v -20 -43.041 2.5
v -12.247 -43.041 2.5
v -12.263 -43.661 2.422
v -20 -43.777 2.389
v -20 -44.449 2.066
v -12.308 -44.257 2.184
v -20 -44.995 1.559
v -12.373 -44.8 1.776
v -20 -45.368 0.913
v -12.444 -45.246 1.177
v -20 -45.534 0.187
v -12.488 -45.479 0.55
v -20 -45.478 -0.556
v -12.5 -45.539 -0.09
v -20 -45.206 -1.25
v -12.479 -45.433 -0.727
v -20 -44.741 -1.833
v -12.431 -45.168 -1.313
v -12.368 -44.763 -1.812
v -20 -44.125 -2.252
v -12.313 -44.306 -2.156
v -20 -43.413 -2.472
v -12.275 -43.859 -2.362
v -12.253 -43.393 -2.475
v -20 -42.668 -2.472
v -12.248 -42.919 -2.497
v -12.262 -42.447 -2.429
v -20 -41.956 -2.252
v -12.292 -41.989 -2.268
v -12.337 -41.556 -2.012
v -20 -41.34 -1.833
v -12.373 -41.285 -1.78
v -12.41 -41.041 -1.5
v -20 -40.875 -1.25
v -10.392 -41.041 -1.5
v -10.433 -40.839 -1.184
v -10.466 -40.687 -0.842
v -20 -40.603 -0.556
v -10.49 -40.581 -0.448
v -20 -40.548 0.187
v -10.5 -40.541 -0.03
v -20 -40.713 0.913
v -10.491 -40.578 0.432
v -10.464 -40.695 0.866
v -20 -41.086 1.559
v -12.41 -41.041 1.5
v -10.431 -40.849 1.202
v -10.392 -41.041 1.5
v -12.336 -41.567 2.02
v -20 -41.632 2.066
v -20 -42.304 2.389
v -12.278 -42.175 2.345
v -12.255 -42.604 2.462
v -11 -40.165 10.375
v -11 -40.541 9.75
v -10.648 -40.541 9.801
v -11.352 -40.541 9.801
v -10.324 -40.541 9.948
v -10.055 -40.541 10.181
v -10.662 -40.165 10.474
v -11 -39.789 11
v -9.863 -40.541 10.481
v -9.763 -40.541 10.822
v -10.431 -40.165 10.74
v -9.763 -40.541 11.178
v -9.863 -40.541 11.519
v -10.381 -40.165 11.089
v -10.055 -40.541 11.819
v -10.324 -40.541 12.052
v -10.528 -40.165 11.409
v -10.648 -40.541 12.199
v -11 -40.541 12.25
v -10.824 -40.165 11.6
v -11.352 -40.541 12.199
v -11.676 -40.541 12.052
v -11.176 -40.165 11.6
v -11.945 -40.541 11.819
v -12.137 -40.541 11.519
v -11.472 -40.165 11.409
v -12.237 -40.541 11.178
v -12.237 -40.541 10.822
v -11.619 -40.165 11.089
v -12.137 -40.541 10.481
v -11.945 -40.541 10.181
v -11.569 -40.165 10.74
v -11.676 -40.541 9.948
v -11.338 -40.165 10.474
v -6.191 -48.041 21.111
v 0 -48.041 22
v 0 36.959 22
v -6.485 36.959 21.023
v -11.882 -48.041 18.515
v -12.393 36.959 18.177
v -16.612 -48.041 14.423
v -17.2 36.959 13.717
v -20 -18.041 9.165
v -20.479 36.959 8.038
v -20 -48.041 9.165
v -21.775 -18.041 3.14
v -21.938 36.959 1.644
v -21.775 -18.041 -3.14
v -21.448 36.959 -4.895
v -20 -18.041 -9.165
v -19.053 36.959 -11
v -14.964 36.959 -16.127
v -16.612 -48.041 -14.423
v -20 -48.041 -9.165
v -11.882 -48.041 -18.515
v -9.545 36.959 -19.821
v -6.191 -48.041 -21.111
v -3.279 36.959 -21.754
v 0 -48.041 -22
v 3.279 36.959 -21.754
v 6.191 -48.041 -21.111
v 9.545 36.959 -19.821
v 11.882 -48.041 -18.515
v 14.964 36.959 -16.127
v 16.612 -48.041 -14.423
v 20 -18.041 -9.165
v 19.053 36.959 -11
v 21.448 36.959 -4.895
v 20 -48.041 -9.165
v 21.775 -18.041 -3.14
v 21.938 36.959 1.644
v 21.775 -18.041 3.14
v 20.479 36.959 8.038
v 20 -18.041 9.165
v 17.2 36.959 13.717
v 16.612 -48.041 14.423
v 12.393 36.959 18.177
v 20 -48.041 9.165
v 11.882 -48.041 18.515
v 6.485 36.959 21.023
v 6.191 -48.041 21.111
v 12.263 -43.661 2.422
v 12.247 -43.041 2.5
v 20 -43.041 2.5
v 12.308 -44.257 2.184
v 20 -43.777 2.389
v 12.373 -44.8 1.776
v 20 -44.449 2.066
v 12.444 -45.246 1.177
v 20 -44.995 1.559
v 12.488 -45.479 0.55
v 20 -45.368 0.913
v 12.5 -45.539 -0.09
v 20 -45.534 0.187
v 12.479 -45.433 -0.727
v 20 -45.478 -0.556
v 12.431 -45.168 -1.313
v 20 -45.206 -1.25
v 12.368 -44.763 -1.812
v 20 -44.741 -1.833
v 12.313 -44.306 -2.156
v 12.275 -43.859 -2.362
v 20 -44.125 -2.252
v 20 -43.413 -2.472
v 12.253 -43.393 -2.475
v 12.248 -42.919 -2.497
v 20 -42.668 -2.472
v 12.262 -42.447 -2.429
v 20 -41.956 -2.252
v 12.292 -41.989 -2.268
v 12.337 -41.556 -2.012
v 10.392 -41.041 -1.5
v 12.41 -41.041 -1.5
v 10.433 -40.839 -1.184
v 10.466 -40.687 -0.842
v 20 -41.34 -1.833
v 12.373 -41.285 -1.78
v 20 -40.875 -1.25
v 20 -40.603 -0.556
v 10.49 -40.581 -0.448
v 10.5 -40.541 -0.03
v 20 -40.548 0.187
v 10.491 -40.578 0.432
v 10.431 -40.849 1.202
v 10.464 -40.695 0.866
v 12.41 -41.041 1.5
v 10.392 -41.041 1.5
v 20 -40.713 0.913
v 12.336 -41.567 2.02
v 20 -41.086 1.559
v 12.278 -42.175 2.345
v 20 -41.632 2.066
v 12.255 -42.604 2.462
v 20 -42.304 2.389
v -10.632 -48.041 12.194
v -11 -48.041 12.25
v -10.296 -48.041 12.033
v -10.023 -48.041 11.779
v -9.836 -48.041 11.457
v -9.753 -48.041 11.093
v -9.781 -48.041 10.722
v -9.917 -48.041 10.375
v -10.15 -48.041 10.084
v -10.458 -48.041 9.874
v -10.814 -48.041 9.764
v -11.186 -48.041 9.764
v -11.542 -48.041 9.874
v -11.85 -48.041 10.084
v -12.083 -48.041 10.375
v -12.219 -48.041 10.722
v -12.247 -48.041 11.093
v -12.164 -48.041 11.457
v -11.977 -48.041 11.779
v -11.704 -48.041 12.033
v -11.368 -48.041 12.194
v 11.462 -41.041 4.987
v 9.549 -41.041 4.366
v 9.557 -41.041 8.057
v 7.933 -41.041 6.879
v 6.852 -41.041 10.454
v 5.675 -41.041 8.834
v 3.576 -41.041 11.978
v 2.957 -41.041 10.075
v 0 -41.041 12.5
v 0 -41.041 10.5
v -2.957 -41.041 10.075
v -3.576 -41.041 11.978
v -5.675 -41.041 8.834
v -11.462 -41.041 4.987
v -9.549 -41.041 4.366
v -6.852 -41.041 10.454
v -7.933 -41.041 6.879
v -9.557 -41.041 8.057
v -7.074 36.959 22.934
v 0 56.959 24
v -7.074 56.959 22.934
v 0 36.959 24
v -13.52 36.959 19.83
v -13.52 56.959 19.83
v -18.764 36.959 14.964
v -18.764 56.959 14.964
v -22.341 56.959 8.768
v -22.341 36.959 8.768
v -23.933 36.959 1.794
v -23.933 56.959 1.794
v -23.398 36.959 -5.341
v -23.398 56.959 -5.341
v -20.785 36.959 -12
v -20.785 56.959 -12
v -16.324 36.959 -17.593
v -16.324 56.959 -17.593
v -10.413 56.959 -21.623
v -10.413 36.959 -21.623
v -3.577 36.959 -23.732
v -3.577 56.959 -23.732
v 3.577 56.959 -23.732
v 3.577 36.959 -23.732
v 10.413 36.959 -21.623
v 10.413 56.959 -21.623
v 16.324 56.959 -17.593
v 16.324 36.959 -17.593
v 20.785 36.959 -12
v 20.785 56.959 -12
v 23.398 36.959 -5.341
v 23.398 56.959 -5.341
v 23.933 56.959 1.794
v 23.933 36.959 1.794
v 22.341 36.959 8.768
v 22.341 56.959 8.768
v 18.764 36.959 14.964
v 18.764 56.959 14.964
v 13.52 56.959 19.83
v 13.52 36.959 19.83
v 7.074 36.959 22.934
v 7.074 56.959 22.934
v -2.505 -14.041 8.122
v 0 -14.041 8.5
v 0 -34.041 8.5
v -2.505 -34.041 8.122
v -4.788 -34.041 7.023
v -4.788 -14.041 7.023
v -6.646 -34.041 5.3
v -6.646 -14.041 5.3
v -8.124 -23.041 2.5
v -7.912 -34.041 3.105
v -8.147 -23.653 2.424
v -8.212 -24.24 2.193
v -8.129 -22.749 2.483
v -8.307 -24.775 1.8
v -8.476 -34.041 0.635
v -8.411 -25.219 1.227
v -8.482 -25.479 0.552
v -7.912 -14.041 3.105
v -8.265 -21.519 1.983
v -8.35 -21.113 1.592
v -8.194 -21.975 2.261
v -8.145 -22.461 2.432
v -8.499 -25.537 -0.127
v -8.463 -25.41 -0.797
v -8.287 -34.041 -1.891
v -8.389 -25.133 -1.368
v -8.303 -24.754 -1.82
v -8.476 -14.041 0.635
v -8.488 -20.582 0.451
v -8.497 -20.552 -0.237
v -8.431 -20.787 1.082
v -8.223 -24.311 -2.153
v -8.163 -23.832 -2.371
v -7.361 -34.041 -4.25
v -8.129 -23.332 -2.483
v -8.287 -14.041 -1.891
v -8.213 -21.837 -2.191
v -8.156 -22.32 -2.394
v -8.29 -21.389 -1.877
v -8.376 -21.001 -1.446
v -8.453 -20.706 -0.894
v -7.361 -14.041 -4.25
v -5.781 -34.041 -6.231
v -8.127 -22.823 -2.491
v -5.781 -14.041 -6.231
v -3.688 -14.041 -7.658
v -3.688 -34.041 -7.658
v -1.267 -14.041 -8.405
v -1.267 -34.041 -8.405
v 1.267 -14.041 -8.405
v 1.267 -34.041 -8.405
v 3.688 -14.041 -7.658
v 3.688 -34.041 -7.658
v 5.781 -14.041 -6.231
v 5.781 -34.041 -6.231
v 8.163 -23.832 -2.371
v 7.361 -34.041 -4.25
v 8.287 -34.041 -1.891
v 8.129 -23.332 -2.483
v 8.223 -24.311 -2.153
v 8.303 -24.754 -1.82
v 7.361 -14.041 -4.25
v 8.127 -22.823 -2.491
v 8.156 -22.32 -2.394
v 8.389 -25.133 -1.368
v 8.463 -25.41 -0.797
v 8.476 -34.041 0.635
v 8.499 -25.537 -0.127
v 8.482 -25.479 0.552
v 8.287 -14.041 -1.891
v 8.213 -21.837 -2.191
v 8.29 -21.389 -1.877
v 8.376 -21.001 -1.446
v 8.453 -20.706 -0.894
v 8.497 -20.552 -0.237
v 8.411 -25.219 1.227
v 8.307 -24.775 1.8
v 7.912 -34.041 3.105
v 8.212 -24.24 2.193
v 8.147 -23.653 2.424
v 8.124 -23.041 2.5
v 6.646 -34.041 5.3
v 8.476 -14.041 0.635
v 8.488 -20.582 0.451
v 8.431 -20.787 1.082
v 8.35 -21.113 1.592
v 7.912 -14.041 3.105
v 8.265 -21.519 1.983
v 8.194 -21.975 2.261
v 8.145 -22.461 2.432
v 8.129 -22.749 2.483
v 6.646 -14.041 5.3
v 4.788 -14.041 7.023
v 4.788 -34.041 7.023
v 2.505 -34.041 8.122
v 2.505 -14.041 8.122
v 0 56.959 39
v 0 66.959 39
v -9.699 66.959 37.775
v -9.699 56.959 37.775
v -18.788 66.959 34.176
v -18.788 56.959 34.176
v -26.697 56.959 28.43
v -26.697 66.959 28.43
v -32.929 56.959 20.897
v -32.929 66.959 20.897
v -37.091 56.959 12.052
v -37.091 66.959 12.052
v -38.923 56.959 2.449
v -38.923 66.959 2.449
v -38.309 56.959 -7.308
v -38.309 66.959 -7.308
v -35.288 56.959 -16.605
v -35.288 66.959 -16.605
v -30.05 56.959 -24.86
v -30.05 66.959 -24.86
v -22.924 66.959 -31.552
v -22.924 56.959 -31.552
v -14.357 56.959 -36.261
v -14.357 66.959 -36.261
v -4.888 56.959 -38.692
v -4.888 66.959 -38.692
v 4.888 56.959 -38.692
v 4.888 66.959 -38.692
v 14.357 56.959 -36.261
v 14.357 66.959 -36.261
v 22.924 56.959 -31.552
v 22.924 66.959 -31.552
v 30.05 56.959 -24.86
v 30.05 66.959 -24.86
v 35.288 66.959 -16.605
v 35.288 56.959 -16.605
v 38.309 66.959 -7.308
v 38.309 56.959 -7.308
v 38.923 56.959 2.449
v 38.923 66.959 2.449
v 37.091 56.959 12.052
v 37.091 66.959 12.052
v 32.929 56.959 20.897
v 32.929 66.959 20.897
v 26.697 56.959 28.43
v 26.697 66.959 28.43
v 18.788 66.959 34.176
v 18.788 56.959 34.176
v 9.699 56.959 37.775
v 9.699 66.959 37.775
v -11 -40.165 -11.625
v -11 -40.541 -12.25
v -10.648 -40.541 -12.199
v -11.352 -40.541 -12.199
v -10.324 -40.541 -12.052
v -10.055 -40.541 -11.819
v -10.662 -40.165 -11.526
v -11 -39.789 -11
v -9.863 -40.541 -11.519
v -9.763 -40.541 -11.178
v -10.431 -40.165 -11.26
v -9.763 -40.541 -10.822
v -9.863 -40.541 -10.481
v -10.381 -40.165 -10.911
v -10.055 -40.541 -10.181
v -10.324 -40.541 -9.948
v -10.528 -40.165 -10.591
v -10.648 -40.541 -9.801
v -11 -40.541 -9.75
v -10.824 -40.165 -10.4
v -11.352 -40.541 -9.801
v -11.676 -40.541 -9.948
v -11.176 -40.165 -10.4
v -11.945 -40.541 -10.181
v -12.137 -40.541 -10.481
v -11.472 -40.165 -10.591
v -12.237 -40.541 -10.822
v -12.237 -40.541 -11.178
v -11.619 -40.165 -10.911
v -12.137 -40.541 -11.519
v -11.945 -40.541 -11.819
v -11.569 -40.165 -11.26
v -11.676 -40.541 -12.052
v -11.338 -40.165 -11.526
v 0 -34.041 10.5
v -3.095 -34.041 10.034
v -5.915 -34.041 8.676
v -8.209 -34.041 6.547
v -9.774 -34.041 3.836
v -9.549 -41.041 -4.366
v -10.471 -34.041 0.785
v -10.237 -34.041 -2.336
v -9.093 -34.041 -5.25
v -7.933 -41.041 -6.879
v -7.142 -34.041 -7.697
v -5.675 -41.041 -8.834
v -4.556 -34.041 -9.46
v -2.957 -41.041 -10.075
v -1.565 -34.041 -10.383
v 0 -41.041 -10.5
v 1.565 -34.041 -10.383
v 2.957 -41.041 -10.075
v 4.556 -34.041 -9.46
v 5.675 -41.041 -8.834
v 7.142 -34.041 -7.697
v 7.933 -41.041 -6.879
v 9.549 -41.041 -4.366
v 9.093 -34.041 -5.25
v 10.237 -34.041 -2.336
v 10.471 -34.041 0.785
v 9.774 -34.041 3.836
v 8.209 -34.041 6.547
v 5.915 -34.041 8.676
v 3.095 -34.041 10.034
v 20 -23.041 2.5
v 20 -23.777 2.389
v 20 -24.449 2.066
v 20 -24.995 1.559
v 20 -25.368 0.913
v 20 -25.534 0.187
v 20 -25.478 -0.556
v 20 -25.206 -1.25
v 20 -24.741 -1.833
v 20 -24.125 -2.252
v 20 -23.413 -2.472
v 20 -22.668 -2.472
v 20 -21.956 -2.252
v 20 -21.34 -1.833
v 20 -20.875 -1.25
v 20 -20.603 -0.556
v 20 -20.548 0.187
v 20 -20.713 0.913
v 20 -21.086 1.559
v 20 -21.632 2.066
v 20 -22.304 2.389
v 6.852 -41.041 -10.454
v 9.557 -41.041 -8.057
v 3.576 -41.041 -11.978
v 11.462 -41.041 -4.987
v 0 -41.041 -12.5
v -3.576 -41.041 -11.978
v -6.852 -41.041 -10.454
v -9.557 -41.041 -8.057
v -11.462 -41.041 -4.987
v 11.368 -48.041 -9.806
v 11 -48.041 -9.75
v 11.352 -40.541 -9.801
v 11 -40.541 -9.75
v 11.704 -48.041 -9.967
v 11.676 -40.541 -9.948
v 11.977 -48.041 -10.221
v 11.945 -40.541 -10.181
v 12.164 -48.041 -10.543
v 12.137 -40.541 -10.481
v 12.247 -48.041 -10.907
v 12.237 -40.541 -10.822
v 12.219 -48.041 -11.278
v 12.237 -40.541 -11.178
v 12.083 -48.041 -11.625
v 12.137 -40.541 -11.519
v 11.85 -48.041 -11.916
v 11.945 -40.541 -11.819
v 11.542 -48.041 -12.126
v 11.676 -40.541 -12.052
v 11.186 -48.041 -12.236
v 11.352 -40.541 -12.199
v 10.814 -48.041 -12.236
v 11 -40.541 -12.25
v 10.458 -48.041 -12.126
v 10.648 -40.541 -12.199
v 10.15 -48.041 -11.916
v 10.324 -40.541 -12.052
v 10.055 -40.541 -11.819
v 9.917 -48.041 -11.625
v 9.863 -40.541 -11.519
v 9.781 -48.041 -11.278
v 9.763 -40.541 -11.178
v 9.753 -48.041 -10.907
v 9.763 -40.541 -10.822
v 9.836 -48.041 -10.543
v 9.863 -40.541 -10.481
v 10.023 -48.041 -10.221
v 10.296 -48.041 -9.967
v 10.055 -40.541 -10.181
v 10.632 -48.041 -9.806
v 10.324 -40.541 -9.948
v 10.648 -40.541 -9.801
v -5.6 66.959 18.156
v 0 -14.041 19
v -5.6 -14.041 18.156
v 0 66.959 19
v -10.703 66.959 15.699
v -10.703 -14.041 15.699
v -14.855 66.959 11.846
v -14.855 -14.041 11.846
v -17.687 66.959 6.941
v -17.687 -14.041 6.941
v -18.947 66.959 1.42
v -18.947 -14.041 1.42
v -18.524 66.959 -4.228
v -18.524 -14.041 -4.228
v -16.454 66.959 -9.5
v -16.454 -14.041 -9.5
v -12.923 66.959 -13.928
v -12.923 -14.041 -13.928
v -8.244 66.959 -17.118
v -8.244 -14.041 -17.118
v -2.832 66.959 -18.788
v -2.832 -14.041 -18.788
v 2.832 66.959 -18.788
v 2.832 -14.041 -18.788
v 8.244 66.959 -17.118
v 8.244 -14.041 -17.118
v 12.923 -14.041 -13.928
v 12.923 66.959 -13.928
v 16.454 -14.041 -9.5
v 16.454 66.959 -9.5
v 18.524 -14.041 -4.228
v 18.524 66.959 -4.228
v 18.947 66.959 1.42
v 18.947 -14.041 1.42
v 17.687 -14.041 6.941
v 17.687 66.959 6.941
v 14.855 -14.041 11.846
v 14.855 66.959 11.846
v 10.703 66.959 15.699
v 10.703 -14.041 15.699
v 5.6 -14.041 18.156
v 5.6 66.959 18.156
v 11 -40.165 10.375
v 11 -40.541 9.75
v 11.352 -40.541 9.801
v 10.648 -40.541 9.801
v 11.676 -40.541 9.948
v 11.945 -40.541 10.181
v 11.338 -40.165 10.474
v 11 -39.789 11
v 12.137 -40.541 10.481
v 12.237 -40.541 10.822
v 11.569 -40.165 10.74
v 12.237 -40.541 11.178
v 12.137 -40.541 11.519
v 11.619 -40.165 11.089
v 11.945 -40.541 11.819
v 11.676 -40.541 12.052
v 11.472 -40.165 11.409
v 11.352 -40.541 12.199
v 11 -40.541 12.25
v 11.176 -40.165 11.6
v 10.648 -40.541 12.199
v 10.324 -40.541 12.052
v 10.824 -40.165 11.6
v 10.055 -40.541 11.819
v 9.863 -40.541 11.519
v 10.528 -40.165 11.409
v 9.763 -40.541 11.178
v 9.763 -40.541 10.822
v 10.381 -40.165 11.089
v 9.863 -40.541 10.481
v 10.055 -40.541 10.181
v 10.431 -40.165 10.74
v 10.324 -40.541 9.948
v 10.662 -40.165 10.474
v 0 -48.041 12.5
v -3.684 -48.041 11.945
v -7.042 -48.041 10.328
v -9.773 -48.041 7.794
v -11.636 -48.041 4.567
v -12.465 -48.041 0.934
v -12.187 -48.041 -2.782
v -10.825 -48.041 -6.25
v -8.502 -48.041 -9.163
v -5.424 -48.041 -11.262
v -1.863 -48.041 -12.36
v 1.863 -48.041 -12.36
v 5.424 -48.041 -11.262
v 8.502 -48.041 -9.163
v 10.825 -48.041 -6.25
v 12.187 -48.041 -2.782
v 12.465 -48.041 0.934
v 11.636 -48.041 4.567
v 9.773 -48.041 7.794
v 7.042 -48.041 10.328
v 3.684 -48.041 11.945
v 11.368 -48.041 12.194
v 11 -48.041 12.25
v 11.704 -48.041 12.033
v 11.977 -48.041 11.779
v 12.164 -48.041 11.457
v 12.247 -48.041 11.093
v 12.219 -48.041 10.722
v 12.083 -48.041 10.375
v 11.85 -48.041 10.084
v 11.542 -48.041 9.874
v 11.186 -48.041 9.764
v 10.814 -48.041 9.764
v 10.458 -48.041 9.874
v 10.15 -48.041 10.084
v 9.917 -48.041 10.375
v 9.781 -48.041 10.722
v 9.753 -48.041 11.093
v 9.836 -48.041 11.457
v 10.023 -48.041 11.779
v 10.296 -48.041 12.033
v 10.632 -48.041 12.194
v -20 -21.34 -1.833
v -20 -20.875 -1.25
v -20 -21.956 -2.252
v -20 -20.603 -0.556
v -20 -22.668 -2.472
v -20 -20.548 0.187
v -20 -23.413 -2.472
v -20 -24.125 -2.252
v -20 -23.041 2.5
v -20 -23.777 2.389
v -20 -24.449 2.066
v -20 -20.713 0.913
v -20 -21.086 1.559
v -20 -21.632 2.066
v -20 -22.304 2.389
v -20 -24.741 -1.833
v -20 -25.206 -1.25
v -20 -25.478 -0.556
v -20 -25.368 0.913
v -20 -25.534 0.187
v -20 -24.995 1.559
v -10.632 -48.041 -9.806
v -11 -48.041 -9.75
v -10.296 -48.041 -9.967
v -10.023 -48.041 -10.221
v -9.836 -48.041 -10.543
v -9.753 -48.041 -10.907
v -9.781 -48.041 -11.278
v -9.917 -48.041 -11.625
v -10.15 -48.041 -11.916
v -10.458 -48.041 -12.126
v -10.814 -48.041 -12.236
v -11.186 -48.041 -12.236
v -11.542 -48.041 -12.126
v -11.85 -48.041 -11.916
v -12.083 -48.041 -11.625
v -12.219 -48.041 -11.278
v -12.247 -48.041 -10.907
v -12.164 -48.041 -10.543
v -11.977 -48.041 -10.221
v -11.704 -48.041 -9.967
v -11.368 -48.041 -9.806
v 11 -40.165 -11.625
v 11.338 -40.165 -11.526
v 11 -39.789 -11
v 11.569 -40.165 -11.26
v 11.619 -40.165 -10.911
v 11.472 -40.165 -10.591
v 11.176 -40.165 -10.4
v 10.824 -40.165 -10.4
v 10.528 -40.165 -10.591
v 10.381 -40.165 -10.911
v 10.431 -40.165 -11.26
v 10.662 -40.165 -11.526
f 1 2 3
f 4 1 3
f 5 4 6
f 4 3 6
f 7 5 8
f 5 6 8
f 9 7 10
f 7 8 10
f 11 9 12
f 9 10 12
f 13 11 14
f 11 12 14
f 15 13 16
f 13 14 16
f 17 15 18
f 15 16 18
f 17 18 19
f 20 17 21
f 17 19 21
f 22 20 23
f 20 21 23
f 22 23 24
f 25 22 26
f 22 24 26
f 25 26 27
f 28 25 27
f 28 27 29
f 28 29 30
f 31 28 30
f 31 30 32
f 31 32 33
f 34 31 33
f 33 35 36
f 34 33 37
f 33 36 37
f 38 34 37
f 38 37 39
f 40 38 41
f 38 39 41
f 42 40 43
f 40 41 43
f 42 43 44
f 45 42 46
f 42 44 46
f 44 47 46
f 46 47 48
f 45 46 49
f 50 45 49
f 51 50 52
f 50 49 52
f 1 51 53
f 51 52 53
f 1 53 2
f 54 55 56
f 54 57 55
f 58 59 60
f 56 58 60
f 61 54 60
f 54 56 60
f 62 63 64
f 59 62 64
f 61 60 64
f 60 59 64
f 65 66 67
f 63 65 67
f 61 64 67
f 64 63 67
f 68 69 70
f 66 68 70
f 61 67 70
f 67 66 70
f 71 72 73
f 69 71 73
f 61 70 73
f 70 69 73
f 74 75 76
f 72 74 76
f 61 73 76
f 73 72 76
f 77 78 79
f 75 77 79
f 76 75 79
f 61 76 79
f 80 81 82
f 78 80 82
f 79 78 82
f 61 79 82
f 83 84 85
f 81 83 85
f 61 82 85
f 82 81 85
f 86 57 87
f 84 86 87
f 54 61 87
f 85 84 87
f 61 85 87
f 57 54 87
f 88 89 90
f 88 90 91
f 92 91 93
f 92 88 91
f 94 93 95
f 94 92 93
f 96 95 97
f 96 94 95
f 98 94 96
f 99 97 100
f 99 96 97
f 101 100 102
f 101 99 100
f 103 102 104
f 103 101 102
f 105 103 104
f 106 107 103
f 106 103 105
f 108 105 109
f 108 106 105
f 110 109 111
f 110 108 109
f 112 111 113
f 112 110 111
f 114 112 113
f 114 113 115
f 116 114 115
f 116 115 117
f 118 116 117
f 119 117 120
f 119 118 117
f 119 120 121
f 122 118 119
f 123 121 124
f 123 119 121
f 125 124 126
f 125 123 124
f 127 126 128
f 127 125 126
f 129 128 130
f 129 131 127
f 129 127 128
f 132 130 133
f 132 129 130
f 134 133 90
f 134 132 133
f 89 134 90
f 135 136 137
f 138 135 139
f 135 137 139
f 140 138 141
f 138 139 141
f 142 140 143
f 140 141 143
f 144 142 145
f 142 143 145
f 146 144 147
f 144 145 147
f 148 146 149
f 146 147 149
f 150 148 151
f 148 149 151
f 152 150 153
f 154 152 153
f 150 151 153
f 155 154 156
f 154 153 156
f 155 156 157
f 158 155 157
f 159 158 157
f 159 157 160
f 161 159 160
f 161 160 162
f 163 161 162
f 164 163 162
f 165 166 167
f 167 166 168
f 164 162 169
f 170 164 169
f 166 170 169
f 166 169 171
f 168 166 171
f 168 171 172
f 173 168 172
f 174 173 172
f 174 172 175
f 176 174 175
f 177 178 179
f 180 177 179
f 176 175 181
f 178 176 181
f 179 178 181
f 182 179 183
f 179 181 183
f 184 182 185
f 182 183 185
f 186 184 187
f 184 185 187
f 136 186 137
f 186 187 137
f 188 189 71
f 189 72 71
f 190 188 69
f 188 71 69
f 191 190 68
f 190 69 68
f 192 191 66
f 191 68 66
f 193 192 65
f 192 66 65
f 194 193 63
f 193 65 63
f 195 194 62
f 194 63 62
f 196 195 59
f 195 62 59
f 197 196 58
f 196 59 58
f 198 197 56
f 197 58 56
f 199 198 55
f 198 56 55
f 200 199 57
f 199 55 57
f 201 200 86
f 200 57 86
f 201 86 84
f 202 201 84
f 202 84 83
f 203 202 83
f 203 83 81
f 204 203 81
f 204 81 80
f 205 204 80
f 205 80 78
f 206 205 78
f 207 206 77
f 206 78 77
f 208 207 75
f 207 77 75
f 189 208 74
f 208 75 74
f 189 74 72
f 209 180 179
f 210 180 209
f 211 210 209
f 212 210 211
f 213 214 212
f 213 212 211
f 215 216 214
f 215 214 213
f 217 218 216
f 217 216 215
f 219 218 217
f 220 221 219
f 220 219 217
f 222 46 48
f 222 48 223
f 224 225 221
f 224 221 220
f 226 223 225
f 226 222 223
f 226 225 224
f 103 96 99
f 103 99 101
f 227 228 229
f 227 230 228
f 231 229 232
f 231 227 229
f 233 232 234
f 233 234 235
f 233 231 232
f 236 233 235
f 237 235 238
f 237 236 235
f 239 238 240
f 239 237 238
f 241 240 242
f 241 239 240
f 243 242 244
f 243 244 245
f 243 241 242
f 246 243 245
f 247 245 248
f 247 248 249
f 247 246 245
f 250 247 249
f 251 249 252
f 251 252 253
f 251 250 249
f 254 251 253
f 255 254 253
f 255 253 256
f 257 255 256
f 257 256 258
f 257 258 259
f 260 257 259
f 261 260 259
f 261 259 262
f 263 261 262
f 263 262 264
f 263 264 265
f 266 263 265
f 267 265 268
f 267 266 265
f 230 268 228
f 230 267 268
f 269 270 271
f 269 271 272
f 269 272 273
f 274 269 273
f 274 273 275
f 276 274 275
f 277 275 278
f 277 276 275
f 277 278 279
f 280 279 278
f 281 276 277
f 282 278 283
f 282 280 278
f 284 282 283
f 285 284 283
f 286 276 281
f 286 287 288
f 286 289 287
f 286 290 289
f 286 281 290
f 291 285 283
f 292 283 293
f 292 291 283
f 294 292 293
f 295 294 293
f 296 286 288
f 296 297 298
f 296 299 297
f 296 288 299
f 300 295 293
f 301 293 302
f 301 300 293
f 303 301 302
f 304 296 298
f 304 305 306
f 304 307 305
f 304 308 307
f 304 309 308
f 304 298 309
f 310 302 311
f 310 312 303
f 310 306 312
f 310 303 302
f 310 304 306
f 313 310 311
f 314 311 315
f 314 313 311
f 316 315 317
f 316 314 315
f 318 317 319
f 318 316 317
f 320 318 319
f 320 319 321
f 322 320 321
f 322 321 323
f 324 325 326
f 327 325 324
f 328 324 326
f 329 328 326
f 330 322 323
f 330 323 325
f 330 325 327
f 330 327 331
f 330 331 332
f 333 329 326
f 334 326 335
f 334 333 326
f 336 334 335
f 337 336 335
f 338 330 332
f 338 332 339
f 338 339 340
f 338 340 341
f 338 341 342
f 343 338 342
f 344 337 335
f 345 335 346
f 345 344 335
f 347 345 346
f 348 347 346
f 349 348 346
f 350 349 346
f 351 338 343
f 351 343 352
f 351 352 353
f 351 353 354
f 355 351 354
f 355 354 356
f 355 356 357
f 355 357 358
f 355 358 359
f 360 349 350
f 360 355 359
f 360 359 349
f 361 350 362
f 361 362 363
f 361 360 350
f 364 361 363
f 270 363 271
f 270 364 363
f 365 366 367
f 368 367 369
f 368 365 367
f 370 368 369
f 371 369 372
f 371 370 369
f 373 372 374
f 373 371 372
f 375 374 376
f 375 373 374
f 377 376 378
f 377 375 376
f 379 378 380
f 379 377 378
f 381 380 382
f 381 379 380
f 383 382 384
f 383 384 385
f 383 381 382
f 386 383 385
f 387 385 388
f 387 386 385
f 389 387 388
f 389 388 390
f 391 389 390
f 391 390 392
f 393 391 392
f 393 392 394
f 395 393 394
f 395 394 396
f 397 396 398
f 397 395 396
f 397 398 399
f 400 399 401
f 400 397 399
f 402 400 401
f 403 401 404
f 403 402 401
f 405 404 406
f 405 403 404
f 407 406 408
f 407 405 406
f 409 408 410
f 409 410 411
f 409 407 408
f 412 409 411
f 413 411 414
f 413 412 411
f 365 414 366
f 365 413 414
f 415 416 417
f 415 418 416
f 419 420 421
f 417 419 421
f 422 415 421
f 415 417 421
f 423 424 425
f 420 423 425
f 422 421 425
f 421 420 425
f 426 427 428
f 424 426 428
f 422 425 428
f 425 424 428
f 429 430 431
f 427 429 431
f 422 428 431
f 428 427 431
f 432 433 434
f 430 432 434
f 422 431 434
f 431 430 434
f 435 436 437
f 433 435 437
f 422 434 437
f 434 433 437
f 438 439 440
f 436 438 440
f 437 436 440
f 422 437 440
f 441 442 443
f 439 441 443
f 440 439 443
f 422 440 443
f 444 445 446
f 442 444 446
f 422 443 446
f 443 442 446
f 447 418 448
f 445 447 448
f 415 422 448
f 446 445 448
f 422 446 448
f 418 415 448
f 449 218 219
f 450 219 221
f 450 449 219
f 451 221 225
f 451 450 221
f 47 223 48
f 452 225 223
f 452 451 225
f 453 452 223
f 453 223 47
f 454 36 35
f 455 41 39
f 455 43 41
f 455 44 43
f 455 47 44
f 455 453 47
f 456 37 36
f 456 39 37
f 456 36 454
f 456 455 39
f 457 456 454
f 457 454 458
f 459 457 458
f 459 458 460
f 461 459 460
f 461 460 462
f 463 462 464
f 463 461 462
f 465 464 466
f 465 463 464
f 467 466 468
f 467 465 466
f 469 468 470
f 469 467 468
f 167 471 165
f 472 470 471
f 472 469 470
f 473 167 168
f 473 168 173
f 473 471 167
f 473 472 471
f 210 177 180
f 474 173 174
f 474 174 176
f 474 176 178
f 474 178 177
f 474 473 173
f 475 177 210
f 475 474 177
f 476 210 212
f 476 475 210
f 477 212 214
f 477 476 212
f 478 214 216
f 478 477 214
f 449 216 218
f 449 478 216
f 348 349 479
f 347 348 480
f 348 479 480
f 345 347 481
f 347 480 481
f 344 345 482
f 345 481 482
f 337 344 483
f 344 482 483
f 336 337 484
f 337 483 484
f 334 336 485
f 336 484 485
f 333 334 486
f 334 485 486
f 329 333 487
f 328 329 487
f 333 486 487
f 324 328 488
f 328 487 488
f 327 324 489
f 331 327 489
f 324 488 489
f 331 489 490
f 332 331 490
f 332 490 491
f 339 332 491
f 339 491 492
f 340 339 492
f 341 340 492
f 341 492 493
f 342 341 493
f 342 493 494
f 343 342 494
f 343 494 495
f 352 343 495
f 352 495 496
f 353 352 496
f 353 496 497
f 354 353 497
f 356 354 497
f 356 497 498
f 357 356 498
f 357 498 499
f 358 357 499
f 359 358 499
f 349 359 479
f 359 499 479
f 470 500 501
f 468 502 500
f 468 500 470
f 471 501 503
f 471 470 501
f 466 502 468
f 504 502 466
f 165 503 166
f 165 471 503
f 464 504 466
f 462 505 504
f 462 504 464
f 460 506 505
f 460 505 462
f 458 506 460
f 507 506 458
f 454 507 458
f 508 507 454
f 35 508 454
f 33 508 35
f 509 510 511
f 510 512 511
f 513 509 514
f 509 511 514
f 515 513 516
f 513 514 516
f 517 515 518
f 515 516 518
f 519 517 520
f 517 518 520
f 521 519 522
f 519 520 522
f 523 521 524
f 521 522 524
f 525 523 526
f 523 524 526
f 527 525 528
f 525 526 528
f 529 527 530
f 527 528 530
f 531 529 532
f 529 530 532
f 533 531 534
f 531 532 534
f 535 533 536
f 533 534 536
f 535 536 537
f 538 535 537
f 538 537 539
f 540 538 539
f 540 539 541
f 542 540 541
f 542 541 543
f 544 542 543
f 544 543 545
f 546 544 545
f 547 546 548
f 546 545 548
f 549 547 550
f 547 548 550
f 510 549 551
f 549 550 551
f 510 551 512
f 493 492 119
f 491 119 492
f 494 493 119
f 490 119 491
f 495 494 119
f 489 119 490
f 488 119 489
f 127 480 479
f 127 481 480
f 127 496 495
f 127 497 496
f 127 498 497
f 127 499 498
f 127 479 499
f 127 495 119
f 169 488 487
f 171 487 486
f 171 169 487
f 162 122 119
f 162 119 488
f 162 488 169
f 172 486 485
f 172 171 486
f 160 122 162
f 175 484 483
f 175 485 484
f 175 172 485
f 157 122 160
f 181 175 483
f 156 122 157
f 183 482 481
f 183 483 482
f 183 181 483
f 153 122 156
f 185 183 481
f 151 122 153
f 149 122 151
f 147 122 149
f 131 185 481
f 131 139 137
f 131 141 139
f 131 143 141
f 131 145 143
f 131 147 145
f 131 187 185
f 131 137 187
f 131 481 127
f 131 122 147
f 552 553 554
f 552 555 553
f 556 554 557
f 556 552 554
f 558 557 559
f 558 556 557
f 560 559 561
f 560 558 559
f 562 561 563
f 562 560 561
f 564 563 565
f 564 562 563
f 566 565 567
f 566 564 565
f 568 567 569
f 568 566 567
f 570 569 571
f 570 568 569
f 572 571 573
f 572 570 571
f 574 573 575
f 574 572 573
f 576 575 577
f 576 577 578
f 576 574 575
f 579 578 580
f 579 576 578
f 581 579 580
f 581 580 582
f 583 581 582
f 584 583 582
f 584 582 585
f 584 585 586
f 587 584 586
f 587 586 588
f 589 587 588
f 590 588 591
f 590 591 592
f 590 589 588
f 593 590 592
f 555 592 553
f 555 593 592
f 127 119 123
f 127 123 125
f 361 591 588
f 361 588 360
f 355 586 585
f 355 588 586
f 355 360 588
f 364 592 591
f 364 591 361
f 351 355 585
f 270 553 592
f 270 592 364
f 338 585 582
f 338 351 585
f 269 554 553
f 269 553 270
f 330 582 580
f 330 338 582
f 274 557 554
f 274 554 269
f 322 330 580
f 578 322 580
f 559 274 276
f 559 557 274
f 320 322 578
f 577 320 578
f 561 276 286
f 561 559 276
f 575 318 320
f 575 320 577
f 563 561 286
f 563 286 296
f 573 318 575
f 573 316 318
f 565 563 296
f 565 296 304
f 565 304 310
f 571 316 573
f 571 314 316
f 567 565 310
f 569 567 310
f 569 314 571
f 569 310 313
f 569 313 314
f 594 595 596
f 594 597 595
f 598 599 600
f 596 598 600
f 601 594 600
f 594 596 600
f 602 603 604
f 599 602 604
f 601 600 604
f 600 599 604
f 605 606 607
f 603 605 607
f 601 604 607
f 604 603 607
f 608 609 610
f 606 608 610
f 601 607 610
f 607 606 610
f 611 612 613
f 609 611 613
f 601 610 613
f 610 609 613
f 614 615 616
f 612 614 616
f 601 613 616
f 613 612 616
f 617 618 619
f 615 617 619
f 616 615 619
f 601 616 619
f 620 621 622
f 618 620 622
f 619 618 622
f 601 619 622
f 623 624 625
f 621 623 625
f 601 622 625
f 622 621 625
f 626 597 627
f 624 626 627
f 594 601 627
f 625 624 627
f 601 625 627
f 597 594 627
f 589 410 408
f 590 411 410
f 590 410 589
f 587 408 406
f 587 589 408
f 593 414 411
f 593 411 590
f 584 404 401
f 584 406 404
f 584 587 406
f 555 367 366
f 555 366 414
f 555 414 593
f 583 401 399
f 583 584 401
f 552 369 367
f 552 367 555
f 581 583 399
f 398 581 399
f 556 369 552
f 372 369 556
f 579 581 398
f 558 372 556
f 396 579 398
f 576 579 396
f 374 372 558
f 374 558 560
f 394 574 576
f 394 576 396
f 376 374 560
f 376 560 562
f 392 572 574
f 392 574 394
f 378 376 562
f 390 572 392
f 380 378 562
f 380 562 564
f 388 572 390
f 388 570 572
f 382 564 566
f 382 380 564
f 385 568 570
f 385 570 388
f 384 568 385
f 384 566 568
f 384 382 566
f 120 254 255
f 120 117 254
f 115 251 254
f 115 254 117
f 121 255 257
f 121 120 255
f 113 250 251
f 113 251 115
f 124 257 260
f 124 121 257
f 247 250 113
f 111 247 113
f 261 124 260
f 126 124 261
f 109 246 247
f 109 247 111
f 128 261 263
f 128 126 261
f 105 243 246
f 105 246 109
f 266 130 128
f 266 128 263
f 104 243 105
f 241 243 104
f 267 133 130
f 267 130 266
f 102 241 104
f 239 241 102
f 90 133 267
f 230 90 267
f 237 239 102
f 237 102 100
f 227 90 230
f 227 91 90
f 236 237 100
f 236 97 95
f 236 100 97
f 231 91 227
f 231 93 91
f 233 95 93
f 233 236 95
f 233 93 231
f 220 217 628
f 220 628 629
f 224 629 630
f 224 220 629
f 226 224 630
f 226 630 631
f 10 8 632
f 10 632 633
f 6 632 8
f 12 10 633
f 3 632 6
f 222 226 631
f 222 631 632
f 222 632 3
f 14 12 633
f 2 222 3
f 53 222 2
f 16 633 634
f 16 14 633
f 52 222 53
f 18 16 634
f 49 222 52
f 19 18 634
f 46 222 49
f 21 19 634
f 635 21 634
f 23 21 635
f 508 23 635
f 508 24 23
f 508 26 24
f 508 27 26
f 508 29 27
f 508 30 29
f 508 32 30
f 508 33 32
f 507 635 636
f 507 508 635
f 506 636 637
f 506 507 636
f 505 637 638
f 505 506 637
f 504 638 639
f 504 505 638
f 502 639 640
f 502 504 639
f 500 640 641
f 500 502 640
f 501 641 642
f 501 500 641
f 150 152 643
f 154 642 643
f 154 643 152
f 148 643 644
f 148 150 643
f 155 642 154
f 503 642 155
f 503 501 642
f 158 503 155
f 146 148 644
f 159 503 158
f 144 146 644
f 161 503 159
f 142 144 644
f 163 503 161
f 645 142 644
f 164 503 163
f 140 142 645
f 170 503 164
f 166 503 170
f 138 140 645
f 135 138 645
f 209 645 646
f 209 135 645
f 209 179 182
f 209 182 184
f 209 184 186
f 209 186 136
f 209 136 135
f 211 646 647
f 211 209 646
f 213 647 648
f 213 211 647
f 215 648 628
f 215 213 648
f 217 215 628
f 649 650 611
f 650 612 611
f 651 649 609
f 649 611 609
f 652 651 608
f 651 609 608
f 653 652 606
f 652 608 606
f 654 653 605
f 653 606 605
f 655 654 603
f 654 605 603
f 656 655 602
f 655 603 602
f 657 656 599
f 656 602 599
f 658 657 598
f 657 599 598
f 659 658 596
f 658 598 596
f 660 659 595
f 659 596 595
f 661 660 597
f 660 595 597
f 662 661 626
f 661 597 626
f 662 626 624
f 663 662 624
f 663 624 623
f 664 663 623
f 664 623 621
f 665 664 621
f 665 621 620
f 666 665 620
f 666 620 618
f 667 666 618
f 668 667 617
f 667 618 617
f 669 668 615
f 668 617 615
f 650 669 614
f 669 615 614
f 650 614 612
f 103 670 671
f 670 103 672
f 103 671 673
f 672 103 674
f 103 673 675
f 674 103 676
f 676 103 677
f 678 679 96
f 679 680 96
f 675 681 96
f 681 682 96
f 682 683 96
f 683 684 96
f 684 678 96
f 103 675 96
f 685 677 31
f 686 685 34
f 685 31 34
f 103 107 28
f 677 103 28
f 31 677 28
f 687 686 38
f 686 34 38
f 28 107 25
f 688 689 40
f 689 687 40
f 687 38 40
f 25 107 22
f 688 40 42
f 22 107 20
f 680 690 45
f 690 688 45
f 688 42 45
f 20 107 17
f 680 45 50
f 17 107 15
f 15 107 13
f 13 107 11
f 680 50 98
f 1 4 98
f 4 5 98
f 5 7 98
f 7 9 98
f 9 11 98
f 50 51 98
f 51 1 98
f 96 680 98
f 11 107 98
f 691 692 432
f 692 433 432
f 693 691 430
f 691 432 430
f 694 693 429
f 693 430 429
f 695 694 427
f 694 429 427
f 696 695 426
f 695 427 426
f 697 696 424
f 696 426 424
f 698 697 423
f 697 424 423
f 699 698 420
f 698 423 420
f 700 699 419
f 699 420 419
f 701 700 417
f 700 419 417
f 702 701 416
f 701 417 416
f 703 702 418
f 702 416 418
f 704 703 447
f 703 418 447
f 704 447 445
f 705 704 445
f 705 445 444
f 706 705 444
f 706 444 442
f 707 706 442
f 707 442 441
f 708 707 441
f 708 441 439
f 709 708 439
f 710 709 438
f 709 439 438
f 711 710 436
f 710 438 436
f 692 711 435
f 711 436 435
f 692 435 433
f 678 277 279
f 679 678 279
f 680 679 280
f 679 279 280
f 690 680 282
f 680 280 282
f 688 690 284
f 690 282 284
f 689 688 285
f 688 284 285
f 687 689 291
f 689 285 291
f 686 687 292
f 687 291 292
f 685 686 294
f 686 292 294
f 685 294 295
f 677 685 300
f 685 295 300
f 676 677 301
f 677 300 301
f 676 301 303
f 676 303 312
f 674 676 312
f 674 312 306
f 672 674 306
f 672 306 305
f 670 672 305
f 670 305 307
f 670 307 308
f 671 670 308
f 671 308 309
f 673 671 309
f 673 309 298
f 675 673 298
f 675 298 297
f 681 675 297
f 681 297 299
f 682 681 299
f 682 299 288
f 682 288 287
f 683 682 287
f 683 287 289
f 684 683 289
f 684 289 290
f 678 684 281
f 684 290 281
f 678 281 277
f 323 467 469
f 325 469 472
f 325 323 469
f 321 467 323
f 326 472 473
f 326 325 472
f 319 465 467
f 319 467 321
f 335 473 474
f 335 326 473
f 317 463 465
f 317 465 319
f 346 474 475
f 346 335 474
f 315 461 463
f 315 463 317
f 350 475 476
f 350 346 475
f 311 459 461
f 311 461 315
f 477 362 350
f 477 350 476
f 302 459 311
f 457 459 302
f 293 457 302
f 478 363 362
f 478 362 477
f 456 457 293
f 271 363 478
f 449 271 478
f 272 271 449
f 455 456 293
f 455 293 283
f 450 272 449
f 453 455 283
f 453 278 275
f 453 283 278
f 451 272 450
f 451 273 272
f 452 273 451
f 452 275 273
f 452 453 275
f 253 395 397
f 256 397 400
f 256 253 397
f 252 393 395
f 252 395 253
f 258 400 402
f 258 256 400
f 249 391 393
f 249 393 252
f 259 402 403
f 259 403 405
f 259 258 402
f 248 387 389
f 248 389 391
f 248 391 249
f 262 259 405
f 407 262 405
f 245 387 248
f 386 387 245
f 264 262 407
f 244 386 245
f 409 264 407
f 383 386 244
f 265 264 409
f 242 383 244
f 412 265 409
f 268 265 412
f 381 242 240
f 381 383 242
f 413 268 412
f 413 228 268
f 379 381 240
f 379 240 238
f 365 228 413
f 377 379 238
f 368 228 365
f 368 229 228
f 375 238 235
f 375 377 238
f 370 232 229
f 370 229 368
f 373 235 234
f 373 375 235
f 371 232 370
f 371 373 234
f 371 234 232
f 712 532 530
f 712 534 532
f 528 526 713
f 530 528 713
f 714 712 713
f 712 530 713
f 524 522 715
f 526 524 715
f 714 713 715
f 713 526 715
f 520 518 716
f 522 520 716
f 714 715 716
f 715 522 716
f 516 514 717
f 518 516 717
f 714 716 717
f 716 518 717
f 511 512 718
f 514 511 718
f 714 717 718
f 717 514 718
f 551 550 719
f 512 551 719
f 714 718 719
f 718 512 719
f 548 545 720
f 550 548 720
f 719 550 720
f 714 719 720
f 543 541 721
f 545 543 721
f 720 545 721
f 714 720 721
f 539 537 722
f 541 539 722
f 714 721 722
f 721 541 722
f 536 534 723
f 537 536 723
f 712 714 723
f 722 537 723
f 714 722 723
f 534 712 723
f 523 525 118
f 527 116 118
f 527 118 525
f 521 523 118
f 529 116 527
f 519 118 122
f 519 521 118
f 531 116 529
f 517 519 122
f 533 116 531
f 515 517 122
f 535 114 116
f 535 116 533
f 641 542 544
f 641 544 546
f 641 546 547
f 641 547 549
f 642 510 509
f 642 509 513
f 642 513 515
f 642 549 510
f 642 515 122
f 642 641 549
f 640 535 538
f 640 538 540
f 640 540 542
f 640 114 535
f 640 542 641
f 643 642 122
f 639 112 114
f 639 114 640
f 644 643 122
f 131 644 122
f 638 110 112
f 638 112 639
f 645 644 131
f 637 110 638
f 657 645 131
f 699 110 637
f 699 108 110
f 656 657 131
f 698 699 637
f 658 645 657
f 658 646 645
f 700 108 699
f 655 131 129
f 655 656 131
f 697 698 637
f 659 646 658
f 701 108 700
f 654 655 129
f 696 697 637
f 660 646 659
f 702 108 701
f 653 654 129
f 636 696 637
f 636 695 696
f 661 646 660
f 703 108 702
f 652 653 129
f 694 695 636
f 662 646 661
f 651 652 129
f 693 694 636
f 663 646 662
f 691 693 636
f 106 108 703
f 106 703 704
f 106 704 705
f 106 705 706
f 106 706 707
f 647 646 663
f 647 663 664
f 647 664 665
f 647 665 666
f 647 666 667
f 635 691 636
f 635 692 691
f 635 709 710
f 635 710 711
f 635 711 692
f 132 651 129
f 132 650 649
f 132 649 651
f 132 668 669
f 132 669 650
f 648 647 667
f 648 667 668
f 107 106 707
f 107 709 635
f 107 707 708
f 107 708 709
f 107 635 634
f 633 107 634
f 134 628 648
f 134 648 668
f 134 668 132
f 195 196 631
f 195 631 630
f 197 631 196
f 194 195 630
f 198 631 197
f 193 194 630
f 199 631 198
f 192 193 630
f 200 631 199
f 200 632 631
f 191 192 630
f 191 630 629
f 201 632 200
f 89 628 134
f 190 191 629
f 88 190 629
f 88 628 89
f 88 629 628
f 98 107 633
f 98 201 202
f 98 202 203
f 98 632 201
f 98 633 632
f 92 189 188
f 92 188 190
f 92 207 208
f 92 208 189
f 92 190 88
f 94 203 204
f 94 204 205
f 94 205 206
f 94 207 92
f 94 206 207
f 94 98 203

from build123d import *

# Parameters (mm, degrees)
M3_TAPPED_HOLE1_D     = 2.5
M3_TAPPED_HOLE1_DEPTH = 7.5
M3_TAPPED_HOLE1_TIP   = 0.751075774
SKETCH4_OUTSIDE_W     = 111.87
SKETCH4_OUTSIDE_H     = 111.87
SKETCH4_OUTSIDE_W_2   = 40
SKETCH4_OUTSIDE_H_2   = 58.988764044
EXTRUDE1_DEPTH        = 30
M6_TAPPED_HOLE1_D     = 5


with BuildPart() as part:
    # Sketch1 → Revolve1 (revolve)
    with BuildSketch(Plane.XY, mode=Mode.PRIVATE) as revolve1_sk:
        Polygon((19, 66.959459459), (39, 66.959459459), (39, 56.959459459), (24, 56.959459459), (24, 36.959459459), (22, 36.959459459), (22, -48.040540541), (12.5, -48.040540541), (12.5, -41.040540541), (10.5, -41.040540541), (10.5, -34.040540541), (8.5, -34.040540541), (8.5, -14.040540541), (19, -14.040540541), align=None)
    revolve(revolve1_sk.sketch.rotate(Axis((0, 66.959459459, 0), (0, -1, 0)), 90), axis=Axis((0, 66.959459459, 0), (0, -1, 0)))

    # M3 Tapped Hole1
    with Locations(Plane(origin=(-11, -48.040540541, 11), x_dir=(0, 0, -1), z_dir=(0, -1, 0))):
        with Locations((0, 0), (0, 22), (22, 0), (22, 22)):
            Hole(M3_TAPPED_HOLE1_D / 2, depth=M3_TAPPED_HOLE1_DEPTH)
            with Locations((0, 0, -(M3_TAPPED_HOLE1_DEPTH + M3_TAPPED_HOLE1_TIP / 2))):  # 118° drill point
                Cone(0, M3_TAPPED_HOLE1_D / 2, M3_TAPPED_HOLE1_TIP, mode=Mode.SUBTRACT)

    # Sketch4 outside → Extrude1 (cut)
    with BuildSketch(Plane.XZ.offset(48.040540541)):
        Rectangle(SKETCH4_OUTSIDE_W, SKETCH4_OUTSIDE_H)
        Rectangle(SKETCH4_OUTSIDE_W_2, SKETCH4_OUTSIDE_H_2, mode=Mode.SUBTRACT)
    extrude(amount=-EXTRUDE1_DEPTH, mode=Mode.SUBTRACT)

    # M6 Tapped Hole1 (through all)
    with Locations(Plane(origin=(-20, -23.040540541, 0), x_dir=(0, 0, -1), z_dir=(-1, 0, 0))):
        with Locations((0, 0), (0, 20)):
            Hole(M6_TAPPED_HOLE1_D / 2)


solid = part.part
